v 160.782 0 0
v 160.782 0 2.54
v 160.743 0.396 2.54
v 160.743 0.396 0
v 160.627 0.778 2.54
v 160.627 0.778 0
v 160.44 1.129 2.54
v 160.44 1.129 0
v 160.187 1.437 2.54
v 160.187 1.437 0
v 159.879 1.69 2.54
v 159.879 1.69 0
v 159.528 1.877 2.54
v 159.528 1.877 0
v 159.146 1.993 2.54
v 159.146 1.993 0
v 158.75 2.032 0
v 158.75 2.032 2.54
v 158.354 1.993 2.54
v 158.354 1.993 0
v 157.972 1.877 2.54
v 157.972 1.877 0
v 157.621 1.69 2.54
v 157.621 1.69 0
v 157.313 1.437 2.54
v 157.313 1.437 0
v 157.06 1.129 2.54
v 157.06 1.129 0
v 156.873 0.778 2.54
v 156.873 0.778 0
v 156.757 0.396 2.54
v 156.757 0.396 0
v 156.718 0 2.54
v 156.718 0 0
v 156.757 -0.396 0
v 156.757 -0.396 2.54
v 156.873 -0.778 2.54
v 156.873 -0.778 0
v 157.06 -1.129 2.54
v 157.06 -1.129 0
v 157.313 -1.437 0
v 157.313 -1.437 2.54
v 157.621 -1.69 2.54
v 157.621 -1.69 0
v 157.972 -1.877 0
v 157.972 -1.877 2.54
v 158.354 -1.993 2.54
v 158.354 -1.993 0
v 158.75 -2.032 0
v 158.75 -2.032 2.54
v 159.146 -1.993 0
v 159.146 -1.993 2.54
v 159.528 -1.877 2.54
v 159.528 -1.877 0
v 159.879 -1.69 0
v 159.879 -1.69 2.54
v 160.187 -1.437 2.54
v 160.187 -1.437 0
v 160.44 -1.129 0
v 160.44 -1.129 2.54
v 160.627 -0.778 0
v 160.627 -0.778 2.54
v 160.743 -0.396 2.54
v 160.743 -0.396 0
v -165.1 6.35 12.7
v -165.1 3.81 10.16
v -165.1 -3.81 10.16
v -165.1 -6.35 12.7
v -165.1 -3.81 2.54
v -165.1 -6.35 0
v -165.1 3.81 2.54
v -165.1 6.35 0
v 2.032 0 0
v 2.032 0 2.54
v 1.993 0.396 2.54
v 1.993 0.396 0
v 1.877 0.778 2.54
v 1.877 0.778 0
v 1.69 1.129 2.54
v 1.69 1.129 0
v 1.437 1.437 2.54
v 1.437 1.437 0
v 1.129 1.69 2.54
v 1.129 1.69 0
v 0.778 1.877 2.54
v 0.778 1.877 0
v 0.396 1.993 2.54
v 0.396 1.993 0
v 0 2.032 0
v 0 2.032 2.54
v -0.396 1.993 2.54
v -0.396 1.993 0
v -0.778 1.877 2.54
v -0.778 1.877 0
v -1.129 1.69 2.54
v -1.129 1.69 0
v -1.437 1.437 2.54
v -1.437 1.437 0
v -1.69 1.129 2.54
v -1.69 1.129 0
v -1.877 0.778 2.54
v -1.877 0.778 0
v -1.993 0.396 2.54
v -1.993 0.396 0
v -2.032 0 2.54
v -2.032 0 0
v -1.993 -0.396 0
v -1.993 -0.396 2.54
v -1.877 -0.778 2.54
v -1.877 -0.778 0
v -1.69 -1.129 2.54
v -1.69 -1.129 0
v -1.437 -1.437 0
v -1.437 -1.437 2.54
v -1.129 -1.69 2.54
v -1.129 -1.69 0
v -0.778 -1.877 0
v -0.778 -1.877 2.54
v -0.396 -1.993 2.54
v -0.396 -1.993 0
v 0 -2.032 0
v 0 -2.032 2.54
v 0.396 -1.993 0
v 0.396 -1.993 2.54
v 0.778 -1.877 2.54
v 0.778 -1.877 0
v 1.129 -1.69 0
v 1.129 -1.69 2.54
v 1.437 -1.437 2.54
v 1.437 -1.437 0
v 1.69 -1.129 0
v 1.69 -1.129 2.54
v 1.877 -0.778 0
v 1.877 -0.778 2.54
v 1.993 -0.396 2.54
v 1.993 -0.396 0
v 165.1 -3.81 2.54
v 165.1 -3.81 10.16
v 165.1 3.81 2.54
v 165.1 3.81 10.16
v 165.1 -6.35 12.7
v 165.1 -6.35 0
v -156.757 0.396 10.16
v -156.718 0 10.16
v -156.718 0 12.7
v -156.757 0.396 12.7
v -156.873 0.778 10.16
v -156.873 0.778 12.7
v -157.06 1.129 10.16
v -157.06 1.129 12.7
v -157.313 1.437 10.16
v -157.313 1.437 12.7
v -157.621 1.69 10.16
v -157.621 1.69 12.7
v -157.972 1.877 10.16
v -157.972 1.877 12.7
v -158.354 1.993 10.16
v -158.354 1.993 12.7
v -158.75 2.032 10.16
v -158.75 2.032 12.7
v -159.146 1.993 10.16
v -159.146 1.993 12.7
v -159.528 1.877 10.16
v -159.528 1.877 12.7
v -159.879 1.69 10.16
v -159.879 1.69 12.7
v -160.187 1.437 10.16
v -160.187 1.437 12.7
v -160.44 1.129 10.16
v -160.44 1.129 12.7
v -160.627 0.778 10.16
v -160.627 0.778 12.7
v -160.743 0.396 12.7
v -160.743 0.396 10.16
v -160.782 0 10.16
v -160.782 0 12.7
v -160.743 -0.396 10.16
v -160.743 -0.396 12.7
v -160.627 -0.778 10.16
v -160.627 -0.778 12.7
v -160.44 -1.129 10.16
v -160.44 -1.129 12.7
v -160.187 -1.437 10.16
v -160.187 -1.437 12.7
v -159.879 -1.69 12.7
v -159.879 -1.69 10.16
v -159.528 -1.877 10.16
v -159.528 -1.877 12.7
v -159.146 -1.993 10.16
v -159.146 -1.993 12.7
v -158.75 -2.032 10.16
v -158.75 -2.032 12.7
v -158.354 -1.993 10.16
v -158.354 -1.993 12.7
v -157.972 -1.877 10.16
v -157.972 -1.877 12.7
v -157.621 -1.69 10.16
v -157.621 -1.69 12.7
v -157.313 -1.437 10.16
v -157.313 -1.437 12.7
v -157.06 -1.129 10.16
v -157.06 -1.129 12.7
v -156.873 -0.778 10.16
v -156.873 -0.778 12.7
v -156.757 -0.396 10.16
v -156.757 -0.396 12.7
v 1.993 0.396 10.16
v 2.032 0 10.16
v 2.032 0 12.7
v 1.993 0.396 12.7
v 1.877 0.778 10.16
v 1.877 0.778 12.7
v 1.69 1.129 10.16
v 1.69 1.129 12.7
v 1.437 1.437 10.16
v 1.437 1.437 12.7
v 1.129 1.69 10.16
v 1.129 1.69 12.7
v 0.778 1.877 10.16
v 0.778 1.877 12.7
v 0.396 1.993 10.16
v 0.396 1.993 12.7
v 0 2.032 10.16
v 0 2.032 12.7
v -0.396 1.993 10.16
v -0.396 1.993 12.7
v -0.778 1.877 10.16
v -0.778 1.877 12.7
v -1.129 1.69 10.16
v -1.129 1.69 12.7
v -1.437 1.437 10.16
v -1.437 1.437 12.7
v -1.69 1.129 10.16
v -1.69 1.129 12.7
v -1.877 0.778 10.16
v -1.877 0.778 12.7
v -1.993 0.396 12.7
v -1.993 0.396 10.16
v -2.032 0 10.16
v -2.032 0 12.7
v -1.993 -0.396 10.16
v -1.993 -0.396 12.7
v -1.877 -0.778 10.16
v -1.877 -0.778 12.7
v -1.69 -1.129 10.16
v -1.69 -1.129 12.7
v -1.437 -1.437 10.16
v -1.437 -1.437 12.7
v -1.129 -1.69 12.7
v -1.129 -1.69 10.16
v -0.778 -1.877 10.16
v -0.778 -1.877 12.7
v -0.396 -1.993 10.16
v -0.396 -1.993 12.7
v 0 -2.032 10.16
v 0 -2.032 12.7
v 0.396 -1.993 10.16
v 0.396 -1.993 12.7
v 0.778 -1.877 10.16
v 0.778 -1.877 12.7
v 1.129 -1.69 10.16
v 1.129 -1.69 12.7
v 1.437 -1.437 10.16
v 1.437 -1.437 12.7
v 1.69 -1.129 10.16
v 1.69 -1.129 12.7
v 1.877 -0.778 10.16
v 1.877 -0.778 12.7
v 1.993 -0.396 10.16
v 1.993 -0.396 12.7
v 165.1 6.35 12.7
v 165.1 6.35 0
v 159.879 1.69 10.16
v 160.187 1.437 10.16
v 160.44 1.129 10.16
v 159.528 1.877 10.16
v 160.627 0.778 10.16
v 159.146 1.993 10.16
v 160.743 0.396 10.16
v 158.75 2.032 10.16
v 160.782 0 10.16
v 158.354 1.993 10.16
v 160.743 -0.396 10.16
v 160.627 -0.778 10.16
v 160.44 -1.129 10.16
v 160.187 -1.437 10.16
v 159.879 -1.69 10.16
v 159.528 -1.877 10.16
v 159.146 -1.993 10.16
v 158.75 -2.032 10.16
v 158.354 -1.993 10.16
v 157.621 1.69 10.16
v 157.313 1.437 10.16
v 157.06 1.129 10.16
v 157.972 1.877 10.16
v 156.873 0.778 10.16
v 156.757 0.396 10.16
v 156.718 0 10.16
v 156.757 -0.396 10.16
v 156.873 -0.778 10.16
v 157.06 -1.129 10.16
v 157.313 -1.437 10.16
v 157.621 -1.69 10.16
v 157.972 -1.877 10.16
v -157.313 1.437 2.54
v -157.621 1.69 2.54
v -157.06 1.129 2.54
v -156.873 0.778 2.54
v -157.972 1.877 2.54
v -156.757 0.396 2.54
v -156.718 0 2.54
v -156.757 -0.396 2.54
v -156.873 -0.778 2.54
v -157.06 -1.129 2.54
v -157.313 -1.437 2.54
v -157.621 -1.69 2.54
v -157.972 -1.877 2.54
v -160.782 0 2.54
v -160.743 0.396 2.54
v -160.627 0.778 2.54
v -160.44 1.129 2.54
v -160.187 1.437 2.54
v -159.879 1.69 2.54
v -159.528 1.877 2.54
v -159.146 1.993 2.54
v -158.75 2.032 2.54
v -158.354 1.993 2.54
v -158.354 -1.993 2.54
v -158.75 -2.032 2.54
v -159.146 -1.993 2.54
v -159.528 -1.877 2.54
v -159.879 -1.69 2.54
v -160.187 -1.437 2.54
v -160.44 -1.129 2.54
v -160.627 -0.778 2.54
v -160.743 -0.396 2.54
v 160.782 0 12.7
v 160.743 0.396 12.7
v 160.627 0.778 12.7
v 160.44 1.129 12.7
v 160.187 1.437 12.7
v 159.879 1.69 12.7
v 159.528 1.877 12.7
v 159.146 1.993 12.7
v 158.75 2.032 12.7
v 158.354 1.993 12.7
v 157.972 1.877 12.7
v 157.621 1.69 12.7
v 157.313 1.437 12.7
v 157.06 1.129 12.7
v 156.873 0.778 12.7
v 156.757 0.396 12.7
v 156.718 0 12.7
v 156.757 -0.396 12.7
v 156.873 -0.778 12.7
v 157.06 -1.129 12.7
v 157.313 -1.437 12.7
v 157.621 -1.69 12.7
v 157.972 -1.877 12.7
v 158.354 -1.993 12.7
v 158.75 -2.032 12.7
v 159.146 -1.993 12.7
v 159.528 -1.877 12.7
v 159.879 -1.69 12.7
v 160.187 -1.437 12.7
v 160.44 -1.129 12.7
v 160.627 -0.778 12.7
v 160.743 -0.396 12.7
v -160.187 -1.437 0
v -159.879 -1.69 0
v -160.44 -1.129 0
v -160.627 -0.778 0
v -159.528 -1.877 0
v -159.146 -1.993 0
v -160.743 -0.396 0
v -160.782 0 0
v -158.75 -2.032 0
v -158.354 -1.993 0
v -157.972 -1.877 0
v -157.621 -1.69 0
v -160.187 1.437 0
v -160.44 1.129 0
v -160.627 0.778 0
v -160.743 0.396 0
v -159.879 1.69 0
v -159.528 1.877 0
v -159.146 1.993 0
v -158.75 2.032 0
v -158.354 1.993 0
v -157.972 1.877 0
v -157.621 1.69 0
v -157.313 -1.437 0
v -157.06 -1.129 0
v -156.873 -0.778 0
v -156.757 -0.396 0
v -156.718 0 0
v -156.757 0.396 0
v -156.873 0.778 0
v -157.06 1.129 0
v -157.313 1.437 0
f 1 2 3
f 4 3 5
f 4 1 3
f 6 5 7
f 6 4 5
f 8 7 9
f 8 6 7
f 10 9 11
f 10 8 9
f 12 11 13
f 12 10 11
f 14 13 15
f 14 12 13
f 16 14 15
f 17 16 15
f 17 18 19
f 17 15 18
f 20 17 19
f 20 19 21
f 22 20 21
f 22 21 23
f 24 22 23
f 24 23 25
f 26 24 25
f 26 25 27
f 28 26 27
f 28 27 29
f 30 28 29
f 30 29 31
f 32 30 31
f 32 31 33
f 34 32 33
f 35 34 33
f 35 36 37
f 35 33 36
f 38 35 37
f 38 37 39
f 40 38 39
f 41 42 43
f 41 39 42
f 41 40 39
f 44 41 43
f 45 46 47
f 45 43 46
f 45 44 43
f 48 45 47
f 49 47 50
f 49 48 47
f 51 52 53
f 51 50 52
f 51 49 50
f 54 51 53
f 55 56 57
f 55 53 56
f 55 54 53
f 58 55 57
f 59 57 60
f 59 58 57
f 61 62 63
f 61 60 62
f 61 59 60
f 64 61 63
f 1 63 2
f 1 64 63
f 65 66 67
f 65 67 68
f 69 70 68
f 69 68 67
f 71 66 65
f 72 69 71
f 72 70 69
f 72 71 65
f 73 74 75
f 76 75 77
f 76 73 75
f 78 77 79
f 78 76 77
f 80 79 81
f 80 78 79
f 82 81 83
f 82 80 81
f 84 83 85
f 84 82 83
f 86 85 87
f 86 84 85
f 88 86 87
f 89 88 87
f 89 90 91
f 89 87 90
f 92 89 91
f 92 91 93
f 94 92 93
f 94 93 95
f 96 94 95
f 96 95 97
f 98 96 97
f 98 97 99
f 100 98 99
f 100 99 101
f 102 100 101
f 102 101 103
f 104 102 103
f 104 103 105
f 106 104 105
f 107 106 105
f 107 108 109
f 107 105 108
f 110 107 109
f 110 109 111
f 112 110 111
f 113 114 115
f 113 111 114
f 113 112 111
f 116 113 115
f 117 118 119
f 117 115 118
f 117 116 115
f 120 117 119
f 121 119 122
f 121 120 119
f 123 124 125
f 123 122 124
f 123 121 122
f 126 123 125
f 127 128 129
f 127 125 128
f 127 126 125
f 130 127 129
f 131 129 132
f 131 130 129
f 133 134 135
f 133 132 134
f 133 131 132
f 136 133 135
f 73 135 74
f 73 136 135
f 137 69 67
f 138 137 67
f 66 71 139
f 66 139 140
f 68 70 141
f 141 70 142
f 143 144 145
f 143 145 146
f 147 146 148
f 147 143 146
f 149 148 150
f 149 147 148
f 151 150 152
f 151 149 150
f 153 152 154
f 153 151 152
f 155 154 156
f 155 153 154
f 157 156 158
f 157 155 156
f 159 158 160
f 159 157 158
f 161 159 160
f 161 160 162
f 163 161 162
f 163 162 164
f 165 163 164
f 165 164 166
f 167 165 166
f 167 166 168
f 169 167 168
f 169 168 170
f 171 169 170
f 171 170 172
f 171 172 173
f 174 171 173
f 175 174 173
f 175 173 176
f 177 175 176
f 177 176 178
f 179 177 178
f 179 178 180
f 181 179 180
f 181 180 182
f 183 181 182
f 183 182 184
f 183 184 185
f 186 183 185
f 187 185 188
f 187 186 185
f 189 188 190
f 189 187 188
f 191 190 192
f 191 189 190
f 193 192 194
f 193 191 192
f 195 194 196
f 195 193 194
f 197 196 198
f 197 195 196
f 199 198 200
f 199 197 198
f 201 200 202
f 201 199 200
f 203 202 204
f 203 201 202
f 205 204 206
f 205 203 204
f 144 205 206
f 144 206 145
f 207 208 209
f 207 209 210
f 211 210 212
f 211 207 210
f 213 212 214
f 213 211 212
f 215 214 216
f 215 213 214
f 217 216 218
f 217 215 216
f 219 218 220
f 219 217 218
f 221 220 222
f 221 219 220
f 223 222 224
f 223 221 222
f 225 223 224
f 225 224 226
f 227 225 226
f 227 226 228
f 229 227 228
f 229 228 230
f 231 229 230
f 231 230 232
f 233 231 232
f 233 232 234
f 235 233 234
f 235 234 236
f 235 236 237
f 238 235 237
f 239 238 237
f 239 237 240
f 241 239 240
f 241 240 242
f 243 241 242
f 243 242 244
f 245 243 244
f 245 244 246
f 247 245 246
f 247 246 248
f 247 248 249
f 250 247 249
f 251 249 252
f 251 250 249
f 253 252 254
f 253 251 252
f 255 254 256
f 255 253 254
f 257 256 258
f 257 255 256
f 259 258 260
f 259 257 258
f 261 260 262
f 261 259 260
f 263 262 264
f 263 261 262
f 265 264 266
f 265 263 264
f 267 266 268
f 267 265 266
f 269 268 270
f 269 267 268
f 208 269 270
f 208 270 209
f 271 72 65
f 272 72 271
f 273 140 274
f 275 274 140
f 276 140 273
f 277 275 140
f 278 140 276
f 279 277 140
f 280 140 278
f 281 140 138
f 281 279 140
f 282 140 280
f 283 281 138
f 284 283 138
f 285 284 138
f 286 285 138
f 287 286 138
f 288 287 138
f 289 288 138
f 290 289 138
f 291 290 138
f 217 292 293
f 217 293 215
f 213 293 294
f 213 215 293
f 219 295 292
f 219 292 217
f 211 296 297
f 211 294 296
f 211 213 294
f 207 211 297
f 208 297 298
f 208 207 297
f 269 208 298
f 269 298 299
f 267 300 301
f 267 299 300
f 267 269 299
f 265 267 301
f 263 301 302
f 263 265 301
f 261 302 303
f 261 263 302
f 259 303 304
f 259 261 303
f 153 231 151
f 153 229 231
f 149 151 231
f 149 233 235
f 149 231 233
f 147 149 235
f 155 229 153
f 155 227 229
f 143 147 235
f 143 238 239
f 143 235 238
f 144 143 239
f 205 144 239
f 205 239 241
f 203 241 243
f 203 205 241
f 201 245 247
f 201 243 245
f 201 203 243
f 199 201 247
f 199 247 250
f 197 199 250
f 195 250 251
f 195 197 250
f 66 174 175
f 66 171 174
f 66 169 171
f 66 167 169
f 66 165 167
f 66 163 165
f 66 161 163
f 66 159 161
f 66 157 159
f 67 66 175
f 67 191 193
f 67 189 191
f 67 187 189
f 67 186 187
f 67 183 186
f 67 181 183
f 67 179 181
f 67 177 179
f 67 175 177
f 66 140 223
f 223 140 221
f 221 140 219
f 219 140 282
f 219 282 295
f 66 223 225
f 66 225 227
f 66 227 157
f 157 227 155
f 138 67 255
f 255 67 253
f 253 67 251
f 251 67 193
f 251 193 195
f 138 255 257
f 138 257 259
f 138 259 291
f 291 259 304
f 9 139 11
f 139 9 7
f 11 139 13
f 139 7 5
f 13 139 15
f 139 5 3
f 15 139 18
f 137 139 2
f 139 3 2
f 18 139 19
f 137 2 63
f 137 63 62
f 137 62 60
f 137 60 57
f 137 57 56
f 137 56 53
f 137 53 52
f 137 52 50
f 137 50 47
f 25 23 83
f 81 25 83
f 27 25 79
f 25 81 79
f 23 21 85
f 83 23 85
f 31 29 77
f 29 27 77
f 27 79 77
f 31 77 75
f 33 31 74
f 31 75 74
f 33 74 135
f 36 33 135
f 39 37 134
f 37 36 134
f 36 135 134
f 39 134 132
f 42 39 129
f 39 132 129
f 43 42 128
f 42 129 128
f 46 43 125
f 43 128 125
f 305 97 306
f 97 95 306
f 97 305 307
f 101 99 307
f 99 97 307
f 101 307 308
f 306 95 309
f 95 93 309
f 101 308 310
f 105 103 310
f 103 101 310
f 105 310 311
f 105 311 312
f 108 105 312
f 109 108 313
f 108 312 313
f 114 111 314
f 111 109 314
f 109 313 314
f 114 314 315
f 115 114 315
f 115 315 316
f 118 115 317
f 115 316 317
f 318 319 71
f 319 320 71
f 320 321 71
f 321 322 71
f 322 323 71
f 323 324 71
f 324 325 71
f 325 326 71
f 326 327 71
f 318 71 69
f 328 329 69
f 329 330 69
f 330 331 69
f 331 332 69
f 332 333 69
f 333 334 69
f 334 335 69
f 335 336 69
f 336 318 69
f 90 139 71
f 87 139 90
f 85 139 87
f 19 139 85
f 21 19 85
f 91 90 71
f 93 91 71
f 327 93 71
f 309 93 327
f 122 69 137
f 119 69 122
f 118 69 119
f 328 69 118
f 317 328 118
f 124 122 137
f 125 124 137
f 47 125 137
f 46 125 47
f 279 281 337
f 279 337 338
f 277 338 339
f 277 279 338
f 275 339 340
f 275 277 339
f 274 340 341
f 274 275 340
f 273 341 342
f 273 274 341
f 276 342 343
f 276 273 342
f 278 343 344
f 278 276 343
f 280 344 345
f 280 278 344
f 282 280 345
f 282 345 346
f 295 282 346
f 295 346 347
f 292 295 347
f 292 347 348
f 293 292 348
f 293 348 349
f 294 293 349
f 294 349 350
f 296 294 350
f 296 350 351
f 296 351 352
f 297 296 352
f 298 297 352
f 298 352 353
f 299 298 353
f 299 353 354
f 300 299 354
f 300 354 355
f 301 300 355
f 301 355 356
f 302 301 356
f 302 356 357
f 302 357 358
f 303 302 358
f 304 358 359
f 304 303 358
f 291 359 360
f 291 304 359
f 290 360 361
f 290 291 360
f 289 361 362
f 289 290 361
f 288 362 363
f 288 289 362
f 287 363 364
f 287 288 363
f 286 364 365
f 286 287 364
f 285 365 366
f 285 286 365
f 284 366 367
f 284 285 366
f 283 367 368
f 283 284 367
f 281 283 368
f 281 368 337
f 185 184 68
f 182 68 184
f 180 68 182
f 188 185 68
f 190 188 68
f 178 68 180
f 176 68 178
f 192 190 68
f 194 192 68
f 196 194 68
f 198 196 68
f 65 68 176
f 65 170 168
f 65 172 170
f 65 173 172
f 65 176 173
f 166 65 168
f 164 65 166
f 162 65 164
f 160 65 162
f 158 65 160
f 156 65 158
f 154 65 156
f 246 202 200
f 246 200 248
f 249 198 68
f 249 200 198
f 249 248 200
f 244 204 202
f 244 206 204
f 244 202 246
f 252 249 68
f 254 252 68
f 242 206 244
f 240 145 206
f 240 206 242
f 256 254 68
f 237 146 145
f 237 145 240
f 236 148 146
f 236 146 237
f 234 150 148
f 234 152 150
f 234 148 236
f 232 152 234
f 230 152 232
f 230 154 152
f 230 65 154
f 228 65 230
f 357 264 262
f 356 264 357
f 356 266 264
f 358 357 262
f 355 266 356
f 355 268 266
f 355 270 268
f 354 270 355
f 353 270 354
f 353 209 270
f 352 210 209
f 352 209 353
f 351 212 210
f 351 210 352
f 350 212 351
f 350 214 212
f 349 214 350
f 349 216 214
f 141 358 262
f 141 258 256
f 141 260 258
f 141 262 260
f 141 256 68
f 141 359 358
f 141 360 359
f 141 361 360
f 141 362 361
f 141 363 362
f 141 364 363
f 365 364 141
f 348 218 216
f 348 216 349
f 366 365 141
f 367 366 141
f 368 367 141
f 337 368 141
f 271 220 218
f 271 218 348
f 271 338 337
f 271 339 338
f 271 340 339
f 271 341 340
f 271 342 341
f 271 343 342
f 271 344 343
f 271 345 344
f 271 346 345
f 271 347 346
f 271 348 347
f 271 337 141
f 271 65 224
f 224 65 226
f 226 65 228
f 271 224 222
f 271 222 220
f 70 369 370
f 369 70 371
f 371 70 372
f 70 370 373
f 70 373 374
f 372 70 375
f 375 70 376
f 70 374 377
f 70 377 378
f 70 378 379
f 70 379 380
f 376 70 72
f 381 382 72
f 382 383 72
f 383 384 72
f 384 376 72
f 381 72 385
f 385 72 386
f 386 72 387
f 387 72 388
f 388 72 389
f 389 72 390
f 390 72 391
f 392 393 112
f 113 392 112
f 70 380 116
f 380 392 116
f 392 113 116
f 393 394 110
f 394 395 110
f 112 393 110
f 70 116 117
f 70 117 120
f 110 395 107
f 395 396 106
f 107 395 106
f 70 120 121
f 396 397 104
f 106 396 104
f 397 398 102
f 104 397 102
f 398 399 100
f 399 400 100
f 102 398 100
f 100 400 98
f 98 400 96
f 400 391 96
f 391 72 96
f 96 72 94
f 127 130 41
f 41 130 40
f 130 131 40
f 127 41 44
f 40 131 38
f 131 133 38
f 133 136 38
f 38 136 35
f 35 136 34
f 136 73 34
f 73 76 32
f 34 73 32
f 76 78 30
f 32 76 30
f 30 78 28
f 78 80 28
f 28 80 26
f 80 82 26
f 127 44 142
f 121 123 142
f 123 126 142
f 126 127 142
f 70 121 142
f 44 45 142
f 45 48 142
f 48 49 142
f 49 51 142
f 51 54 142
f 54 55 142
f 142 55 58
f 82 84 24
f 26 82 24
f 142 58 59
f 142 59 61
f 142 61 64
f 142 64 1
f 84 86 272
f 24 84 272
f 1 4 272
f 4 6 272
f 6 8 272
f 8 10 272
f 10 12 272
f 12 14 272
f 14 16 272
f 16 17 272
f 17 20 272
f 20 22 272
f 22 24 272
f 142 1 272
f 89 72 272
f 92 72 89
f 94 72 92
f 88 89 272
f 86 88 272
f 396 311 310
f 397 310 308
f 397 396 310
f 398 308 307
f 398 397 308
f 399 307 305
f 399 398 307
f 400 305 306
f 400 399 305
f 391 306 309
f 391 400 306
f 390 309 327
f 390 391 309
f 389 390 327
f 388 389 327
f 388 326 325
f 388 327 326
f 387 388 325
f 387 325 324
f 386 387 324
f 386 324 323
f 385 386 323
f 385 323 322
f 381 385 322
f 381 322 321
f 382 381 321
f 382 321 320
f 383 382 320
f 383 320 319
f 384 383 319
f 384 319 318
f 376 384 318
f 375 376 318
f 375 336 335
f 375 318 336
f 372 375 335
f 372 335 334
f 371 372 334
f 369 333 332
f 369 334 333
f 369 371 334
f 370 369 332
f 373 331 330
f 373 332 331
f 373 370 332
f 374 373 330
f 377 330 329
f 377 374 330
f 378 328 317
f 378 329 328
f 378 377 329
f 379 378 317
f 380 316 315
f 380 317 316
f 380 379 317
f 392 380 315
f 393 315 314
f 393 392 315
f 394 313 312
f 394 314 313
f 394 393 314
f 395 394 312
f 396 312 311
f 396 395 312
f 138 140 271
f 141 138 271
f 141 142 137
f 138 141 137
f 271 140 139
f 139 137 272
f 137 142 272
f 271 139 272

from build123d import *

# Parameters (mm, degrees)
F0_W     = 330.2
F0_H     = 12.7
F0_R     = 2.032
F1_DEPTH = 12.7
F2_W     = 7.62
F2_H     = 7.62
F3_DEPTH = 424.18


with BuildPart() as f1:
    # F0 (on Top) → F1 (new body)
    with BuildSketch(Plane.XY):
        Rectangle(F0_W, F0_H)
        with Locations((-158.75, 0)):
            Circle(F0_R, mode=Mode.SUBTRACT)
        Circle(F0_R, mode=Mode.SUBTRACT)
        with Locations((158.75, 0)):
            Circle(F0_R, mode=Mode.SUBTRACT)
    extrude(amount=F1_DEPTH)

    # F2 (on face) → F3 (cut)
    with BuildSketch(Plane(origin=(-165.1, 0, 0), x_dir=(0, -1, 0), z_dir=(-1, 0, 0))):
        with Locations((0, 6.35)):
            Rectangle(F2_W, F2_H)
    extrude(amount=-F3_DEPTH, mode=Mode.SUBTRACT)


solid = f1.part
